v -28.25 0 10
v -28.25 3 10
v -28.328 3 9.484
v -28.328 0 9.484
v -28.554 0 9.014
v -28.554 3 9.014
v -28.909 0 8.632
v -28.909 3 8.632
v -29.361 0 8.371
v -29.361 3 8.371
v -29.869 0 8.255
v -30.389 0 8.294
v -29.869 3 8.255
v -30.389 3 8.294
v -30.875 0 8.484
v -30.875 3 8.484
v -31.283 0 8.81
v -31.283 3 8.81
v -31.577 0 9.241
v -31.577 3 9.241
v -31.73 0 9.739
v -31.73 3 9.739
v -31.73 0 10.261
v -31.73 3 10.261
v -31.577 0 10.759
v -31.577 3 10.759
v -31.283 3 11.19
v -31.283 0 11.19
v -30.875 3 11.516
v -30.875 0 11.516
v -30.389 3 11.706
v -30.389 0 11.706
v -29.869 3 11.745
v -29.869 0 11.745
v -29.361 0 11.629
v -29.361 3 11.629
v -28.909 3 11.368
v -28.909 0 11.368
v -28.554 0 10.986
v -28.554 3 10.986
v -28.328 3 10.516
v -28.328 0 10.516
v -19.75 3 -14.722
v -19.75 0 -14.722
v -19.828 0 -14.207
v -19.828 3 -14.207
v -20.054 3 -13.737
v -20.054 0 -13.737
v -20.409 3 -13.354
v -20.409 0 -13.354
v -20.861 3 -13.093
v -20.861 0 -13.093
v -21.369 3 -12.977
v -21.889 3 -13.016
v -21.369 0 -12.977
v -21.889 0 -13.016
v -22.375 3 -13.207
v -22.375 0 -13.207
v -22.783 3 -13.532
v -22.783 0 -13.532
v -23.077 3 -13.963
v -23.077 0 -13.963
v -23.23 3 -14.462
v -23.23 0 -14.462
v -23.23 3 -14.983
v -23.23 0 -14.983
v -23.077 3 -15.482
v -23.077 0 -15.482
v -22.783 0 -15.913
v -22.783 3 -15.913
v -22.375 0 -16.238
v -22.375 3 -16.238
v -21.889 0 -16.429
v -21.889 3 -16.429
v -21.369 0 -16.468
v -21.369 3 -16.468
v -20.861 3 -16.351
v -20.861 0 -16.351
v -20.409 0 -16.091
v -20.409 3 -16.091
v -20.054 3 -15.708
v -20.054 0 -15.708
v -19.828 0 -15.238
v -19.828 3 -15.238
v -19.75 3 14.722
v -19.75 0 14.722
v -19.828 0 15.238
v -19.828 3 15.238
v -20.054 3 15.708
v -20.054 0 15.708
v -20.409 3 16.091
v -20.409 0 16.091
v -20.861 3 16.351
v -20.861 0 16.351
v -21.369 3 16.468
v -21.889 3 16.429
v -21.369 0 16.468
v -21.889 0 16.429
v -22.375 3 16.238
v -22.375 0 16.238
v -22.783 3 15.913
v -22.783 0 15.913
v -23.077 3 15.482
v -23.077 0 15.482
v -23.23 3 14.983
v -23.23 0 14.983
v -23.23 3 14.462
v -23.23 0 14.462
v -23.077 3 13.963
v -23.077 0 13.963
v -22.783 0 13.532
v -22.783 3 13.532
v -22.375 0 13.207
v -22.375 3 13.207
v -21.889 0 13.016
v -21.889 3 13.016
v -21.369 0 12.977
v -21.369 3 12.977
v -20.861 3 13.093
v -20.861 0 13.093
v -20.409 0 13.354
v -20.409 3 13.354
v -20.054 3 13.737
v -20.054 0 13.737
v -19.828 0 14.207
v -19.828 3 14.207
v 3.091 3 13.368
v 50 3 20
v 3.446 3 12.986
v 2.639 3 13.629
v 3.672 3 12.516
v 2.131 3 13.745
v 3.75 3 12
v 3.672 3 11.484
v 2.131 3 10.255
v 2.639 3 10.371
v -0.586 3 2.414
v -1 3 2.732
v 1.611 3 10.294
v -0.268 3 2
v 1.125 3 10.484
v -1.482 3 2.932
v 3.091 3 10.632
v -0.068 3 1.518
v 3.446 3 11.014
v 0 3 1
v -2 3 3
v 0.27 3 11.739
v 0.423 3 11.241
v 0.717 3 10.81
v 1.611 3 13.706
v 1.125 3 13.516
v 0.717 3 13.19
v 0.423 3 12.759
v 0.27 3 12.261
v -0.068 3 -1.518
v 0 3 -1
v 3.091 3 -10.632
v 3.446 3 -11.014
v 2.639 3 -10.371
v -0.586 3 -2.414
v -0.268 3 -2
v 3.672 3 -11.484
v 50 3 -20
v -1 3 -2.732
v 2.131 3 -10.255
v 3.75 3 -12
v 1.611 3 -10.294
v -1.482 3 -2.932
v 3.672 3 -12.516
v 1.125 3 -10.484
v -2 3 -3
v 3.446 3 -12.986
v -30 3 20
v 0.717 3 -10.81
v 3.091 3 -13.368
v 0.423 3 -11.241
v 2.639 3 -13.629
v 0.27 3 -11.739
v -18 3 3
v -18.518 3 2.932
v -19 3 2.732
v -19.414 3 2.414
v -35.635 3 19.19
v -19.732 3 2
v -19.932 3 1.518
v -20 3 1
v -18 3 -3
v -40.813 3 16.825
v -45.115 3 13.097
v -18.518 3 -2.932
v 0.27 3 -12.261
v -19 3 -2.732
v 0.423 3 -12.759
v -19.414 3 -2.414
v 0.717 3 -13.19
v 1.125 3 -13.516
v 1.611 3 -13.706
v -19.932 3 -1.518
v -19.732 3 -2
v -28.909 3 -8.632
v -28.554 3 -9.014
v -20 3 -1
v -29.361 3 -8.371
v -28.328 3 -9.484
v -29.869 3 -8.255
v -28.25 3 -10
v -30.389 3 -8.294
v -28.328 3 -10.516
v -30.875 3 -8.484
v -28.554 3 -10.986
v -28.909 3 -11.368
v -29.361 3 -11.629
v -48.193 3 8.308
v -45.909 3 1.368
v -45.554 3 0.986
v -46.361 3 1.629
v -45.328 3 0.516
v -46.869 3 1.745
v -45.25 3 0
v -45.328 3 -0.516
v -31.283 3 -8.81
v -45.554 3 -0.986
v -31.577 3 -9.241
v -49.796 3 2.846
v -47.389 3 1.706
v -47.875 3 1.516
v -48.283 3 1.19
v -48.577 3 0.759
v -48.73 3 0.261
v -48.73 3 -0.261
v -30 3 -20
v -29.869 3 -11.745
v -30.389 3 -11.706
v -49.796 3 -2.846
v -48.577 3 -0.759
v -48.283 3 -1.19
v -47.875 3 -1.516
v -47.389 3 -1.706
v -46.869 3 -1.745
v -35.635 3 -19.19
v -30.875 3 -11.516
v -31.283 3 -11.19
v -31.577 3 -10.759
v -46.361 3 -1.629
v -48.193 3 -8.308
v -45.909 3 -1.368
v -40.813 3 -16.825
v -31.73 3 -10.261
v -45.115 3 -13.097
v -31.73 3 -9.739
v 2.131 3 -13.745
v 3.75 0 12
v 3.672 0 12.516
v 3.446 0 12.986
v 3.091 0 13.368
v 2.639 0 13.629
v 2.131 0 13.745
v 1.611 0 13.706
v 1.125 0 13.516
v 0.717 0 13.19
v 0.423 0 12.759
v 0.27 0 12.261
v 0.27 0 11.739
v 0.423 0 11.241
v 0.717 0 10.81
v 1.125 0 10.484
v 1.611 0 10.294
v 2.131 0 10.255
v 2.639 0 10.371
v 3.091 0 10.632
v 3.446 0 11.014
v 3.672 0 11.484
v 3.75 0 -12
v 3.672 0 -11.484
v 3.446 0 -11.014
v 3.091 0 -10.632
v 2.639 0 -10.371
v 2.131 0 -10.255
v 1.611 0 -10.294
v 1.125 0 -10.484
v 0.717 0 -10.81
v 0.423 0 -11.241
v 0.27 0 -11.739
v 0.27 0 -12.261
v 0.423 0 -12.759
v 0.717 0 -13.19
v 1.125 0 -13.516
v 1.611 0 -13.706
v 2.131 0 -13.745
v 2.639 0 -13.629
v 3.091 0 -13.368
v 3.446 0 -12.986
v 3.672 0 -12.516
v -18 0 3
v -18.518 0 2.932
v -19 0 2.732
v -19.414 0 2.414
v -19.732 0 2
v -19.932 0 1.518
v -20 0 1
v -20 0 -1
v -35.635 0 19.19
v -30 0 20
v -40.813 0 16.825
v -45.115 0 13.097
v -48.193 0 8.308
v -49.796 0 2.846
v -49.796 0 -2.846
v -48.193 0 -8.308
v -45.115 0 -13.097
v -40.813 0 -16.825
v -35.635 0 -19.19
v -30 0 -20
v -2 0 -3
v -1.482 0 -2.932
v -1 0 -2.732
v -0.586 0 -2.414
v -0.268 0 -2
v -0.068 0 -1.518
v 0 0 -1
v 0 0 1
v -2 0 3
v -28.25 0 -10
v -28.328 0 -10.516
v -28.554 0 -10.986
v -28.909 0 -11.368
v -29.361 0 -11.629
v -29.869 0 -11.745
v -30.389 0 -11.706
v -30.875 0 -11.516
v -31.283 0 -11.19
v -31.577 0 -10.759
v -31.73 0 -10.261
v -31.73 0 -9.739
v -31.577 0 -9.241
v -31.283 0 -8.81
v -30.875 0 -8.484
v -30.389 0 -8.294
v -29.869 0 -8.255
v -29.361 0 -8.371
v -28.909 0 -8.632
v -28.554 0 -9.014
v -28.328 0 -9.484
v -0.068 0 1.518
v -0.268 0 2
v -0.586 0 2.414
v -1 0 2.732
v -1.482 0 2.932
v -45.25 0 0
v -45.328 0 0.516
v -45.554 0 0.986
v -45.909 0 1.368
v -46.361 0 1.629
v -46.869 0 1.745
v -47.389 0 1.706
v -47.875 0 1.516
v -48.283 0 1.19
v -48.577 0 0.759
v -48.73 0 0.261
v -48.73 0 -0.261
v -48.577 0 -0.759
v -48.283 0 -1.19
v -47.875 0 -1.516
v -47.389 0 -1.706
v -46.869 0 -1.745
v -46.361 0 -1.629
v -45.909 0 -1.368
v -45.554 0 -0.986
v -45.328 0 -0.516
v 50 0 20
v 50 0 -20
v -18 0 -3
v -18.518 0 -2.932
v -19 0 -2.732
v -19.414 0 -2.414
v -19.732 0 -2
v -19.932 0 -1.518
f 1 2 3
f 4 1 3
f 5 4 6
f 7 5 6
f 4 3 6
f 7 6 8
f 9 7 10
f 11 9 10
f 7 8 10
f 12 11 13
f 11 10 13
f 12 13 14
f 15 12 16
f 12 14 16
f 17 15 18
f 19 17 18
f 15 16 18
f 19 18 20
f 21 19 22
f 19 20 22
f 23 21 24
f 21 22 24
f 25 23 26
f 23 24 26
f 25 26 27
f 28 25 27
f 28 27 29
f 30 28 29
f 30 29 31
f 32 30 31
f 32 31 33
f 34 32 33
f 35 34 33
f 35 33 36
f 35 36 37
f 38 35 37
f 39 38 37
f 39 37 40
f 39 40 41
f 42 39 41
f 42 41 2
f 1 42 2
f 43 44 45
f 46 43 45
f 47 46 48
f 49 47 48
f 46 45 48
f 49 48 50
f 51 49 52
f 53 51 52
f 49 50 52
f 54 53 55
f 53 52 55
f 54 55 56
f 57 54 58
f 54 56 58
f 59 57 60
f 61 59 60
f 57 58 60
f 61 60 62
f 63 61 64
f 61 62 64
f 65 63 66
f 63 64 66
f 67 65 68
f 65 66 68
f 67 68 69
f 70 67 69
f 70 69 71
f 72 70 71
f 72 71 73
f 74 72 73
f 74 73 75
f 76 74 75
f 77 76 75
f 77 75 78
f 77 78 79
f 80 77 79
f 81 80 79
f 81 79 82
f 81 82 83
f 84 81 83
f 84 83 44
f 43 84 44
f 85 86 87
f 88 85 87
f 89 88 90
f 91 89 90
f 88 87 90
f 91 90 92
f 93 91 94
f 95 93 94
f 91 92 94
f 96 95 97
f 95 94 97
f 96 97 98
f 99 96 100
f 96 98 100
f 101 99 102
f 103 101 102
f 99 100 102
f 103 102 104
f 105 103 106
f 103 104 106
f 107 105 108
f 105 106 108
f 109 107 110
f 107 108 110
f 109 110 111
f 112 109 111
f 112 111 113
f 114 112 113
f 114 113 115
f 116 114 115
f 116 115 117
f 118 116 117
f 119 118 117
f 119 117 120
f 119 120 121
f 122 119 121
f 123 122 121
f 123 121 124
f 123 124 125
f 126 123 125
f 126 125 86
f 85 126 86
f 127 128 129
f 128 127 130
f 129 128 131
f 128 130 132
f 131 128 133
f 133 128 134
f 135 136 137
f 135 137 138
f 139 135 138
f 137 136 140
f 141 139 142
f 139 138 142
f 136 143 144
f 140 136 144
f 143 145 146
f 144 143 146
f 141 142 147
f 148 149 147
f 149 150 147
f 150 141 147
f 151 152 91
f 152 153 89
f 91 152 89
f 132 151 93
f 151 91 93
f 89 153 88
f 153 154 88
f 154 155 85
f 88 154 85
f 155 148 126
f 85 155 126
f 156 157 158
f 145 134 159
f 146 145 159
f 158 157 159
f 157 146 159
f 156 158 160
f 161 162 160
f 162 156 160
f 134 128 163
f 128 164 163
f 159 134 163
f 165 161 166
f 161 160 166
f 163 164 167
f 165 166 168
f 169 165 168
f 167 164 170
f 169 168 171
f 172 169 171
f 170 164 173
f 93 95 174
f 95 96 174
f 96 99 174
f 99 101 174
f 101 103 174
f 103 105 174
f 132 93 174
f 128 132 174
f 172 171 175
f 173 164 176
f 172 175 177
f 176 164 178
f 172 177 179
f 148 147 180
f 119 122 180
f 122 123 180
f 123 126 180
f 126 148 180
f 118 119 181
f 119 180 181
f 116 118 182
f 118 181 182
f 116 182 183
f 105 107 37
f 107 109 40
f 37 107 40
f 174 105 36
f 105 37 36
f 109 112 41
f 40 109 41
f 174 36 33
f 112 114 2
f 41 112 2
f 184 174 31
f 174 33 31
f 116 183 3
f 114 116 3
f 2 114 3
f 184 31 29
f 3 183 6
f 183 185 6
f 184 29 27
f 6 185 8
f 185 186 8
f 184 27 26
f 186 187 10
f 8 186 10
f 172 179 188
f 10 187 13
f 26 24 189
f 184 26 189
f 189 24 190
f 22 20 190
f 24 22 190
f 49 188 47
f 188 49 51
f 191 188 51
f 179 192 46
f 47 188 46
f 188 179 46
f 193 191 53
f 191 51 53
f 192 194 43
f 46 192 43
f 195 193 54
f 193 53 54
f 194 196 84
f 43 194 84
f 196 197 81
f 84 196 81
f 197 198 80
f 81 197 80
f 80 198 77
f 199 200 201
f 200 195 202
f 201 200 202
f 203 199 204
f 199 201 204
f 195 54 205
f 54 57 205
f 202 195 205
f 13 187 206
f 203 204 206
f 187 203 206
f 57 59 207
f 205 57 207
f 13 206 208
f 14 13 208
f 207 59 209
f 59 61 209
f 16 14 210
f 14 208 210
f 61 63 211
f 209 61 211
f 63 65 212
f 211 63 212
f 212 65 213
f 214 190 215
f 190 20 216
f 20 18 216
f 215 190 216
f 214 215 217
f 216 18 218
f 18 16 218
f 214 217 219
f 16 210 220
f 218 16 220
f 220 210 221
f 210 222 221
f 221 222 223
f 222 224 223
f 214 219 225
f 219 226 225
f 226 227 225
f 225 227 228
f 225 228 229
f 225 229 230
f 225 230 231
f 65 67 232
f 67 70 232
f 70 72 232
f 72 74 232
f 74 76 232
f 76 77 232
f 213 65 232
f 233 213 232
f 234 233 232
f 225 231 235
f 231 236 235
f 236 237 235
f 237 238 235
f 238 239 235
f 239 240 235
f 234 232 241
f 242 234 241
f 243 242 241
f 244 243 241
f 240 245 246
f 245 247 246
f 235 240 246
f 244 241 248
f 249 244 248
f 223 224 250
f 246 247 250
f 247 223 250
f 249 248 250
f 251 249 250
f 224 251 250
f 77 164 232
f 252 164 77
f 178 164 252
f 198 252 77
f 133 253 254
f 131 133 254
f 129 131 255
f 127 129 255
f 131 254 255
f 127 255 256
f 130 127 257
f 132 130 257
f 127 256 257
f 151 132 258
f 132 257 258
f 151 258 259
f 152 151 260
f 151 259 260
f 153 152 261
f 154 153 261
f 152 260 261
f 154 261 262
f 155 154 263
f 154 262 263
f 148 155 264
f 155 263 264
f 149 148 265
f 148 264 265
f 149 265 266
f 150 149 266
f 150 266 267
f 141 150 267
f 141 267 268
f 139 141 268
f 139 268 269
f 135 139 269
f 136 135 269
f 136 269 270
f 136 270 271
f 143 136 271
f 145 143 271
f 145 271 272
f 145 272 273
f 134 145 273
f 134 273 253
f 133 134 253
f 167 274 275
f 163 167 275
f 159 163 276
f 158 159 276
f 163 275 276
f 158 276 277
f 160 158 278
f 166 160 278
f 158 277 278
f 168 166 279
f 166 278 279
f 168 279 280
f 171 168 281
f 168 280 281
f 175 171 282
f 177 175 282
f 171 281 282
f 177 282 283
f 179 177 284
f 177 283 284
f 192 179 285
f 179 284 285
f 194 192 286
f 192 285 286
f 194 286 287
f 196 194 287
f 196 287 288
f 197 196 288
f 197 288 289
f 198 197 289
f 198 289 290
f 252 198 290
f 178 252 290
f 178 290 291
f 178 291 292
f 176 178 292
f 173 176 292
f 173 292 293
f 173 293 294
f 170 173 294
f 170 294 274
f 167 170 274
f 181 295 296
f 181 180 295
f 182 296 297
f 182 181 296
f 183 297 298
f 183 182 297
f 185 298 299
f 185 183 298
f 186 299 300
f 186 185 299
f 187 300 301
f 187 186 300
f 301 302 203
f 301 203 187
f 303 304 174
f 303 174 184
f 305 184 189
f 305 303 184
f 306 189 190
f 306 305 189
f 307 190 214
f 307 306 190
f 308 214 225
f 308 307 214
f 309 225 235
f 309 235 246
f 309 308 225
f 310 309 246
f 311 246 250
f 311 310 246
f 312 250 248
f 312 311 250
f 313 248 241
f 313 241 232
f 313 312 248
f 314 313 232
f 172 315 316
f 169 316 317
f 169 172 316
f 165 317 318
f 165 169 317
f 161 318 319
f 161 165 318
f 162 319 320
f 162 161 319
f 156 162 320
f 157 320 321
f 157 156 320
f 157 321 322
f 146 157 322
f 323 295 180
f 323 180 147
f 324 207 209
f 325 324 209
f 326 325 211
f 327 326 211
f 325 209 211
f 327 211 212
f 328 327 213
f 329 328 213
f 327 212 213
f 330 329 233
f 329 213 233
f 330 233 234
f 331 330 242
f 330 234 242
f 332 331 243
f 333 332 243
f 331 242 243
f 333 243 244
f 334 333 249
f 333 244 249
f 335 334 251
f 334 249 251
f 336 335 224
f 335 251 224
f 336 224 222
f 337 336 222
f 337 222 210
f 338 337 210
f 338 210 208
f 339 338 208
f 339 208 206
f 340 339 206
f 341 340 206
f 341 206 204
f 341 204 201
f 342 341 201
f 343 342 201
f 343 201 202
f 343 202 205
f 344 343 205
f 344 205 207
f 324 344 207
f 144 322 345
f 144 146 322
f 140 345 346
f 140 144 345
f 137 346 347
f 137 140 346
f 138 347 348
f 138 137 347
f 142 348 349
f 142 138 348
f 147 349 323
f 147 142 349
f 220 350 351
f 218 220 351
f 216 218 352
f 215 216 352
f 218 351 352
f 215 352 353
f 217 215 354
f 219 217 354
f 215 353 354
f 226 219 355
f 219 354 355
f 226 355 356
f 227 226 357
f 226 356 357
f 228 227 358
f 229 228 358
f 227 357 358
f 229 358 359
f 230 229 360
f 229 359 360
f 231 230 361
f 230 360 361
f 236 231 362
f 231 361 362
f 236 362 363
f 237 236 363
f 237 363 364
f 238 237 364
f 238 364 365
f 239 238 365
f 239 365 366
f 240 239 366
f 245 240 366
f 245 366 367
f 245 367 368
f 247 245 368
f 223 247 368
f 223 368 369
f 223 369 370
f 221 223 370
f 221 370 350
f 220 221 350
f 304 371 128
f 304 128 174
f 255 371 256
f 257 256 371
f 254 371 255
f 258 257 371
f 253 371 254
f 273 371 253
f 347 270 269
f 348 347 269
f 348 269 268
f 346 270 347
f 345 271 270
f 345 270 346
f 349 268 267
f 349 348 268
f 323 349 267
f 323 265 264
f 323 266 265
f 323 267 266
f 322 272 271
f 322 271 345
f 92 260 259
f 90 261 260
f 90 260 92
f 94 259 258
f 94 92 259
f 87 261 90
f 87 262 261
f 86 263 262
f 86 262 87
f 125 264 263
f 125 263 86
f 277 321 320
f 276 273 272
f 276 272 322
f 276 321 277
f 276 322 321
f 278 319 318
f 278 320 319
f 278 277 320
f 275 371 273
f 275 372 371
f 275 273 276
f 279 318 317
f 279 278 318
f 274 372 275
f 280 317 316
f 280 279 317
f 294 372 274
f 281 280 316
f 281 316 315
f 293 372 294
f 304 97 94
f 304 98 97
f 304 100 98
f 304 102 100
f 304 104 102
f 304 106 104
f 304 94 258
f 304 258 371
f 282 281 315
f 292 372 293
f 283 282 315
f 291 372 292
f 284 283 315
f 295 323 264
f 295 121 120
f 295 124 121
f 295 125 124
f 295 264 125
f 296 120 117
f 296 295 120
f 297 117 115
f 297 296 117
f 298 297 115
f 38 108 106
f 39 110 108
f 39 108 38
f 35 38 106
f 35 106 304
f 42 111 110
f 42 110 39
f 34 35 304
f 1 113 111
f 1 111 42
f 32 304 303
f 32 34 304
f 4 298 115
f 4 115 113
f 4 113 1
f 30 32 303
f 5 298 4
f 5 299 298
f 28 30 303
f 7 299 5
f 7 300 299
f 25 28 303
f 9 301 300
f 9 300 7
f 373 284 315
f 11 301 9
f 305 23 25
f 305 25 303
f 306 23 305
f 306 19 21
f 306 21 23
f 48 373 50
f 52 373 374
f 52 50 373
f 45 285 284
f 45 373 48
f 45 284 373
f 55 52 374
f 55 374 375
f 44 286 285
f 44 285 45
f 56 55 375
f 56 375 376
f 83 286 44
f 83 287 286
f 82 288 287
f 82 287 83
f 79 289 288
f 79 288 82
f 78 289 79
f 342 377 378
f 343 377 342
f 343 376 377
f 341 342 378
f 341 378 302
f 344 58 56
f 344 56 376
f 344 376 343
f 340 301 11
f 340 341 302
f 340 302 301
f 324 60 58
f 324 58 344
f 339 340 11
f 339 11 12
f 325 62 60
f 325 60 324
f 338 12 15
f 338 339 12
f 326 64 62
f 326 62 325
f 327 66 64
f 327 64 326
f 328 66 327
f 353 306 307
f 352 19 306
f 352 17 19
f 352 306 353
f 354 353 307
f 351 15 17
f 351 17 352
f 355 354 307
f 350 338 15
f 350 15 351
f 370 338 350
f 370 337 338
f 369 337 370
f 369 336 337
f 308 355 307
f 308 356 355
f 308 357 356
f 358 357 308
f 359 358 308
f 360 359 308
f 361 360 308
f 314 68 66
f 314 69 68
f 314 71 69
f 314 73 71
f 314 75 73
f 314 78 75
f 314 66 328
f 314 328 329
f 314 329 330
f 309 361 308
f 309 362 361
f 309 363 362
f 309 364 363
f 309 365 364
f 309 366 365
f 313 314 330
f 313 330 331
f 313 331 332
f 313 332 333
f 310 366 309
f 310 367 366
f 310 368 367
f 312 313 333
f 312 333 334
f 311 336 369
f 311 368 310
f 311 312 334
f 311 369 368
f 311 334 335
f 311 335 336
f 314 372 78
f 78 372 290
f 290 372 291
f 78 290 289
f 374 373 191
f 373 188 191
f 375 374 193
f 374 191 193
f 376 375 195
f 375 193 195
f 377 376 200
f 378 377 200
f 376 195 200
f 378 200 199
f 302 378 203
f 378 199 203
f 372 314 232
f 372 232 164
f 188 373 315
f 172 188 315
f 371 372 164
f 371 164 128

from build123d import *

# Parameters (mm, degrees)
BOSS_EXTRUDE1_DEPTH = 3
SKETCH3_R           = 1.75
CUT_EXTRUDE1_DEPTH  = 4
CUT_EXTRUDE2_REACH  = 5
SKETCH4_W           = 20
SKETCH4_H           = 6
FILLET1_R           = 2
CUT_EXTRUDE3_REACH  = 5
SKETCH5_R           = 1.75
CUT_EXTRUDE4_REACH  = 5
SKETCH7_R           = 1.75


with BuildPart() as part:
    # Sketch1 → Boss-Extrude1 (new body)
    with BuildSketch(Plane(origin=(0, 0, 0), x_dir=(1, 0, 0), z_dir=(0, 1, 0))):
        with BuildLine():
            Line((50, -20), (-30, -20))
            ThreePointArc((-30, -20), (-50, 0), (-30, 20))
            Line((-30, 20), (50, 20))
            Line((50, 20), (50, -20))
        make_face()
    extrude(amount=BOSS_EXTRUDE1_DEPTH)

    # Sketch3 → Cut-Extrude1 (cut, through all)
    with BuildSketch(Plane(origin=(0, 3, 0), x_dir=(1, 0, 0), z_dir=(0, 1, 0))):
        with Locations((-30, 10)):
            Circle(SKETCH3_R)
        with Locations((-30, -10)):
            Circle(SKETCH3_R)
    extrude(amount=-CUT_EXTRUDE1_DEPTH, mode=Mode.SUBTRACT)

    # Sketch4 → Cut-Extrude2 (cut, up to next)
    with BuildSketch(Plane.XZ, mode=Mode.PRIVATE) as cut_extrude2_sk1:
        with Locations((-10, 0)):
            Rectangle(SKETCH4_W, SKETCH4_H)
    cut_extrude2_tool1 = extrude(cut_extrude2_sk1.sketch, amount=-CUT_EXTRUDE2_REACH, mode=Mode.PRIVATE) & part.part
    add(cut_extrude2_tool1.solids().sort_by_distance((-10, 0, 0))[0], mode=Mode.SUBTRACT)

    # Fillet1
    fillet1_edges = [part.edges().sort_by_distance(p)[0] for p in [
        (-20, 1.5, -3),
        (-20, 1.5, 3),
        (0, 1.5, 3),
        (0, 1.5, -3),
    ]]
    fillet(fillet1_edges, radius=FILLET1_R)

    # Sketch5 → Cut-Extrude3 (cut, up to next)
    with BuildSketch(Plane.XZ, mode=Mode.PRIVATE) as cut_extrude3_sk1:
        with Locations((-21.5, -14.722431864)):
            Circle(SKETCH5_R)
    cut_extrude3_tool1 = extrude(cut_extrude3_sk1.sketch, amount=-CUT_EXTRUDE3_REACH, mode=Mode.PRIVATE) & part.part
    add(cut_extrude3_tool1.solids().sort_by_distance((-21.5, 0, -14.722432))[0], mode=Mode.SUBTRACT)
    # Sketch5 → Cut-Extrude3 (cut, up to next)
    with BuildSketch(Plane.XZ, mode=Mode.PRIVATE) as cut_extrude3_sk2:
        with Locations((-21.5, 14.722431864)):
            Circle(SKETCH5_R)
    cut_extrude3_tool2 = extrude(cut_extrude3_sk2.sketch, amount=-CUT_EXTRUDE3_REACH, mode=Mode.PRIVATE) & part.part
    add(cut_extrude3_tool2.solids().sort_by_distance((-21.5, 0, 14.722432))[0], mode=Mode.SUBTRACT)
    # Sketch5 → Cut-Extrude3 (cut, up to next)
    with BuildSketch(Plane.XZ, mode=Mode.PRIVATE) as cut_extrude3_sk3:
        with Locations((-47, 0)):
            Circle(SKETCH5_R)
    cut_extrude3_tool3 = extrude(cut_extrude3_sk3.sketch, amount=-CUT_EXTRUDE3_REACH, mode=Mode.PRIVATE) & part.part
    add(cut_extrude3_tool3.solids().sort_by_distance((-47, 0, 0))[0], mode=Mode.SUBTRACT)

    # Sketch7 → Cut-Extrude4 (cut, up to next)
    with BuildSketch(Plane.XZ, mode=Mode.PRIVATE) as cut_extrude4_sk1:
        with Locations((2, 12)):
            Circle(SKETCH7_R)
    cut_extrude4_tool1 = extrude(cut_extrude4_sk1.sketch, amount=-CUT_EXTRUDE4_REACH, mode=Mode.PRIVATE) & part.part
    add(cut_extrude4_tool1.solids().sort_by_distance((2, 0, 12))[0], mode=Mode.SUBTRACT)
    # Sketch7 → Cut-Extrude4 (cut, up to next)
    with BuildSketch(Plane.XZ, mode=Mode.PRIVATE) as cut_extrude4_sk2:
        with Locations((2, -12)):
            Circle(SKETCH7_R)
    cut_extrude4_tool2 = extrude(cut_extrude4_sk2.sketch, amount=-CUT_EXTRUDE4_REACH, mode=Mode.PRIVATE) & part.part
    add(cut_extrude4_tool2.solids().sort_by_distance((2, 0, -12))[0], mode=Mode.SUBTRACT)


solid = part.part
